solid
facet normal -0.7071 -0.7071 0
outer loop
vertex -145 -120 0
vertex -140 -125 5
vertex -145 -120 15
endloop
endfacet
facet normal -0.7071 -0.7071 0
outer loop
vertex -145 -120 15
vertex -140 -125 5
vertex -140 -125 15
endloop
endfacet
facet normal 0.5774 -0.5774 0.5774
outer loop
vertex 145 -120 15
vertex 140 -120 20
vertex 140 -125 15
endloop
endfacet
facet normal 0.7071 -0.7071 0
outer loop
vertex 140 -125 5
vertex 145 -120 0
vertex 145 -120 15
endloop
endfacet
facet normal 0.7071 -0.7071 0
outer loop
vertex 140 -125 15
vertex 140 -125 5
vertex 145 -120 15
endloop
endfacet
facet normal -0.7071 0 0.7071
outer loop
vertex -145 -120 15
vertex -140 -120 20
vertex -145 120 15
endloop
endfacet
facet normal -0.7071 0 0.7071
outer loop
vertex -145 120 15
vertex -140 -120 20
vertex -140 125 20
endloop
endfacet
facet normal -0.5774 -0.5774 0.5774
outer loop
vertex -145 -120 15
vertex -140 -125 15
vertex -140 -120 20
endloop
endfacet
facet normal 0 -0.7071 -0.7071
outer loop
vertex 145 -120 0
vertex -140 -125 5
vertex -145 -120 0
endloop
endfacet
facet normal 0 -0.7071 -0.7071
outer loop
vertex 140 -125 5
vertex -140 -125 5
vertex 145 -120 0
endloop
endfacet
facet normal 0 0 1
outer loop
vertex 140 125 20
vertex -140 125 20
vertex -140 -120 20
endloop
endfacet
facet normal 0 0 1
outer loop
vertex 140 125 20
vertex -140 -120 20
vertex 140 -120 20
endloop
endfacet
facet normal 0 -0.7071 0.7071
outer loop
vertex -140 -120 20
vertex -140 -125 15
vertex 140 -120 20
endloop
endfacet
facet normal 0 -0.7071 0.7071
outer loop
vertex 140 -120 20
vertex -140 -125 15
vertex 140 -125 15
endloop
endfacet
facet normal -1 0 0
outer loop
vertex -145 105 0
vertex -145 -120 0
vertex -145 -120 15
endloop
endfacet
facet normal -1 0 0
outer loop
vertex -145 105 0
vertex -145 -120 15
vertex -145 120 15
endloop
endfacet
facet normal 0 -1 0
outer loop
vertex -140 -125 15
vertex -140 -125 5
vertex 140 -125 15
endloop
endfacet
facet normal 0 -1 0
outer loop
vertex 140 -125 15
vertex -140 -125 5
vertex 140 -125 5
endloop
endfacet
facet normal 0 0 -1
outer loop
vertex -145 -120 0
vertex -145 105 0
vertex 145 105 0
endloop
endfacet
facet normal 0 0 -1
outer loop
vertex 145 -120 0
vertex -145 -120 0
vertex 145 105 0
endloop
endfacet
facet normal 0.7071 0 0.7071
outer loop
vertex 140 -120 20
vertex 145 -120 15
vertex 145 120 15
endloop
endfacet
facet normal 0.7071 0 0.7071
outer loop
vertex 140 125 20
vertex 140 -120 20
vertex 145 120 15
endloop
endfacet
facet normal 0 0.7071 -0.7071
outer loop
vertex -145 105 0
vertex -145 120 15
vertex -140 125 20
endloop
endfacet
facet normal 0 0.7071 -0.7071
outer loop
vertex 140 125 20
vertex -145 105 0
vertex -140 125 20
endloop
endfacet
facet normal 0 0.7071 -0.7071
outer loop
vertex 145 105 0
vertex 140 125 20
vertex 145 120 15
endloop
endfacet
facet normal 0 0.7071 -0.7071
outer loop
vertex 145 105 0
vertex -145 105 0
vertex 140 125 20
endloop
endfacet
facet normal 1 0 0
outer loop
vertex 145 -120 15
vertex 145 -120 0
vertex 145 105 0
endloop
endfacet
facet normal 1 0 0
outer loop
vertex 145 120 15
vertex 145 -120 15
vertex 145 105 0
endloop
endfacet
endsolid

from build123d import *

# Parameters (mm, degrees)
F0_W     = 290
F0_H     = 250
F1_DEPTH = 20
F2_SIZE  = 19.99999
F3_SIZE  = 5


# Not quite as in the source:
# - a fillet or chamfer is up to 0.001 mm smaller than in the source, because OpenCascade refuses the exact size


with BuildPart() as f1:
    # F0 (on Top) → F1 (new body)
    with BuildSketch(Plane.XY):
        Rectangle(F0_W, F0_H)
    extrude(amount=F1_DEPTH)

    # F2 (size 20 in the source; OpenCascade refuses exactly that, so slightly less here)
    f2_edges = [f1.edges().sort_by_distance(p)[0] for p in [
        (0, 125, 0),
    ]]
    chamfer(f2_edges, length=F2_SIZE)

    # F3
    f3_edges = [f1.edges().sort_by_distance(p)[0] for p in [
        (0, -125, 20),
        (0, -125, 0),
        (145, 0, 20),
        (145, -125, 10),
        (-145, -125, 10),
        (-145, 0, 20),
    ]]
    chamfer(f3_edges, length=F3_SIZE)


solid = f1.part
